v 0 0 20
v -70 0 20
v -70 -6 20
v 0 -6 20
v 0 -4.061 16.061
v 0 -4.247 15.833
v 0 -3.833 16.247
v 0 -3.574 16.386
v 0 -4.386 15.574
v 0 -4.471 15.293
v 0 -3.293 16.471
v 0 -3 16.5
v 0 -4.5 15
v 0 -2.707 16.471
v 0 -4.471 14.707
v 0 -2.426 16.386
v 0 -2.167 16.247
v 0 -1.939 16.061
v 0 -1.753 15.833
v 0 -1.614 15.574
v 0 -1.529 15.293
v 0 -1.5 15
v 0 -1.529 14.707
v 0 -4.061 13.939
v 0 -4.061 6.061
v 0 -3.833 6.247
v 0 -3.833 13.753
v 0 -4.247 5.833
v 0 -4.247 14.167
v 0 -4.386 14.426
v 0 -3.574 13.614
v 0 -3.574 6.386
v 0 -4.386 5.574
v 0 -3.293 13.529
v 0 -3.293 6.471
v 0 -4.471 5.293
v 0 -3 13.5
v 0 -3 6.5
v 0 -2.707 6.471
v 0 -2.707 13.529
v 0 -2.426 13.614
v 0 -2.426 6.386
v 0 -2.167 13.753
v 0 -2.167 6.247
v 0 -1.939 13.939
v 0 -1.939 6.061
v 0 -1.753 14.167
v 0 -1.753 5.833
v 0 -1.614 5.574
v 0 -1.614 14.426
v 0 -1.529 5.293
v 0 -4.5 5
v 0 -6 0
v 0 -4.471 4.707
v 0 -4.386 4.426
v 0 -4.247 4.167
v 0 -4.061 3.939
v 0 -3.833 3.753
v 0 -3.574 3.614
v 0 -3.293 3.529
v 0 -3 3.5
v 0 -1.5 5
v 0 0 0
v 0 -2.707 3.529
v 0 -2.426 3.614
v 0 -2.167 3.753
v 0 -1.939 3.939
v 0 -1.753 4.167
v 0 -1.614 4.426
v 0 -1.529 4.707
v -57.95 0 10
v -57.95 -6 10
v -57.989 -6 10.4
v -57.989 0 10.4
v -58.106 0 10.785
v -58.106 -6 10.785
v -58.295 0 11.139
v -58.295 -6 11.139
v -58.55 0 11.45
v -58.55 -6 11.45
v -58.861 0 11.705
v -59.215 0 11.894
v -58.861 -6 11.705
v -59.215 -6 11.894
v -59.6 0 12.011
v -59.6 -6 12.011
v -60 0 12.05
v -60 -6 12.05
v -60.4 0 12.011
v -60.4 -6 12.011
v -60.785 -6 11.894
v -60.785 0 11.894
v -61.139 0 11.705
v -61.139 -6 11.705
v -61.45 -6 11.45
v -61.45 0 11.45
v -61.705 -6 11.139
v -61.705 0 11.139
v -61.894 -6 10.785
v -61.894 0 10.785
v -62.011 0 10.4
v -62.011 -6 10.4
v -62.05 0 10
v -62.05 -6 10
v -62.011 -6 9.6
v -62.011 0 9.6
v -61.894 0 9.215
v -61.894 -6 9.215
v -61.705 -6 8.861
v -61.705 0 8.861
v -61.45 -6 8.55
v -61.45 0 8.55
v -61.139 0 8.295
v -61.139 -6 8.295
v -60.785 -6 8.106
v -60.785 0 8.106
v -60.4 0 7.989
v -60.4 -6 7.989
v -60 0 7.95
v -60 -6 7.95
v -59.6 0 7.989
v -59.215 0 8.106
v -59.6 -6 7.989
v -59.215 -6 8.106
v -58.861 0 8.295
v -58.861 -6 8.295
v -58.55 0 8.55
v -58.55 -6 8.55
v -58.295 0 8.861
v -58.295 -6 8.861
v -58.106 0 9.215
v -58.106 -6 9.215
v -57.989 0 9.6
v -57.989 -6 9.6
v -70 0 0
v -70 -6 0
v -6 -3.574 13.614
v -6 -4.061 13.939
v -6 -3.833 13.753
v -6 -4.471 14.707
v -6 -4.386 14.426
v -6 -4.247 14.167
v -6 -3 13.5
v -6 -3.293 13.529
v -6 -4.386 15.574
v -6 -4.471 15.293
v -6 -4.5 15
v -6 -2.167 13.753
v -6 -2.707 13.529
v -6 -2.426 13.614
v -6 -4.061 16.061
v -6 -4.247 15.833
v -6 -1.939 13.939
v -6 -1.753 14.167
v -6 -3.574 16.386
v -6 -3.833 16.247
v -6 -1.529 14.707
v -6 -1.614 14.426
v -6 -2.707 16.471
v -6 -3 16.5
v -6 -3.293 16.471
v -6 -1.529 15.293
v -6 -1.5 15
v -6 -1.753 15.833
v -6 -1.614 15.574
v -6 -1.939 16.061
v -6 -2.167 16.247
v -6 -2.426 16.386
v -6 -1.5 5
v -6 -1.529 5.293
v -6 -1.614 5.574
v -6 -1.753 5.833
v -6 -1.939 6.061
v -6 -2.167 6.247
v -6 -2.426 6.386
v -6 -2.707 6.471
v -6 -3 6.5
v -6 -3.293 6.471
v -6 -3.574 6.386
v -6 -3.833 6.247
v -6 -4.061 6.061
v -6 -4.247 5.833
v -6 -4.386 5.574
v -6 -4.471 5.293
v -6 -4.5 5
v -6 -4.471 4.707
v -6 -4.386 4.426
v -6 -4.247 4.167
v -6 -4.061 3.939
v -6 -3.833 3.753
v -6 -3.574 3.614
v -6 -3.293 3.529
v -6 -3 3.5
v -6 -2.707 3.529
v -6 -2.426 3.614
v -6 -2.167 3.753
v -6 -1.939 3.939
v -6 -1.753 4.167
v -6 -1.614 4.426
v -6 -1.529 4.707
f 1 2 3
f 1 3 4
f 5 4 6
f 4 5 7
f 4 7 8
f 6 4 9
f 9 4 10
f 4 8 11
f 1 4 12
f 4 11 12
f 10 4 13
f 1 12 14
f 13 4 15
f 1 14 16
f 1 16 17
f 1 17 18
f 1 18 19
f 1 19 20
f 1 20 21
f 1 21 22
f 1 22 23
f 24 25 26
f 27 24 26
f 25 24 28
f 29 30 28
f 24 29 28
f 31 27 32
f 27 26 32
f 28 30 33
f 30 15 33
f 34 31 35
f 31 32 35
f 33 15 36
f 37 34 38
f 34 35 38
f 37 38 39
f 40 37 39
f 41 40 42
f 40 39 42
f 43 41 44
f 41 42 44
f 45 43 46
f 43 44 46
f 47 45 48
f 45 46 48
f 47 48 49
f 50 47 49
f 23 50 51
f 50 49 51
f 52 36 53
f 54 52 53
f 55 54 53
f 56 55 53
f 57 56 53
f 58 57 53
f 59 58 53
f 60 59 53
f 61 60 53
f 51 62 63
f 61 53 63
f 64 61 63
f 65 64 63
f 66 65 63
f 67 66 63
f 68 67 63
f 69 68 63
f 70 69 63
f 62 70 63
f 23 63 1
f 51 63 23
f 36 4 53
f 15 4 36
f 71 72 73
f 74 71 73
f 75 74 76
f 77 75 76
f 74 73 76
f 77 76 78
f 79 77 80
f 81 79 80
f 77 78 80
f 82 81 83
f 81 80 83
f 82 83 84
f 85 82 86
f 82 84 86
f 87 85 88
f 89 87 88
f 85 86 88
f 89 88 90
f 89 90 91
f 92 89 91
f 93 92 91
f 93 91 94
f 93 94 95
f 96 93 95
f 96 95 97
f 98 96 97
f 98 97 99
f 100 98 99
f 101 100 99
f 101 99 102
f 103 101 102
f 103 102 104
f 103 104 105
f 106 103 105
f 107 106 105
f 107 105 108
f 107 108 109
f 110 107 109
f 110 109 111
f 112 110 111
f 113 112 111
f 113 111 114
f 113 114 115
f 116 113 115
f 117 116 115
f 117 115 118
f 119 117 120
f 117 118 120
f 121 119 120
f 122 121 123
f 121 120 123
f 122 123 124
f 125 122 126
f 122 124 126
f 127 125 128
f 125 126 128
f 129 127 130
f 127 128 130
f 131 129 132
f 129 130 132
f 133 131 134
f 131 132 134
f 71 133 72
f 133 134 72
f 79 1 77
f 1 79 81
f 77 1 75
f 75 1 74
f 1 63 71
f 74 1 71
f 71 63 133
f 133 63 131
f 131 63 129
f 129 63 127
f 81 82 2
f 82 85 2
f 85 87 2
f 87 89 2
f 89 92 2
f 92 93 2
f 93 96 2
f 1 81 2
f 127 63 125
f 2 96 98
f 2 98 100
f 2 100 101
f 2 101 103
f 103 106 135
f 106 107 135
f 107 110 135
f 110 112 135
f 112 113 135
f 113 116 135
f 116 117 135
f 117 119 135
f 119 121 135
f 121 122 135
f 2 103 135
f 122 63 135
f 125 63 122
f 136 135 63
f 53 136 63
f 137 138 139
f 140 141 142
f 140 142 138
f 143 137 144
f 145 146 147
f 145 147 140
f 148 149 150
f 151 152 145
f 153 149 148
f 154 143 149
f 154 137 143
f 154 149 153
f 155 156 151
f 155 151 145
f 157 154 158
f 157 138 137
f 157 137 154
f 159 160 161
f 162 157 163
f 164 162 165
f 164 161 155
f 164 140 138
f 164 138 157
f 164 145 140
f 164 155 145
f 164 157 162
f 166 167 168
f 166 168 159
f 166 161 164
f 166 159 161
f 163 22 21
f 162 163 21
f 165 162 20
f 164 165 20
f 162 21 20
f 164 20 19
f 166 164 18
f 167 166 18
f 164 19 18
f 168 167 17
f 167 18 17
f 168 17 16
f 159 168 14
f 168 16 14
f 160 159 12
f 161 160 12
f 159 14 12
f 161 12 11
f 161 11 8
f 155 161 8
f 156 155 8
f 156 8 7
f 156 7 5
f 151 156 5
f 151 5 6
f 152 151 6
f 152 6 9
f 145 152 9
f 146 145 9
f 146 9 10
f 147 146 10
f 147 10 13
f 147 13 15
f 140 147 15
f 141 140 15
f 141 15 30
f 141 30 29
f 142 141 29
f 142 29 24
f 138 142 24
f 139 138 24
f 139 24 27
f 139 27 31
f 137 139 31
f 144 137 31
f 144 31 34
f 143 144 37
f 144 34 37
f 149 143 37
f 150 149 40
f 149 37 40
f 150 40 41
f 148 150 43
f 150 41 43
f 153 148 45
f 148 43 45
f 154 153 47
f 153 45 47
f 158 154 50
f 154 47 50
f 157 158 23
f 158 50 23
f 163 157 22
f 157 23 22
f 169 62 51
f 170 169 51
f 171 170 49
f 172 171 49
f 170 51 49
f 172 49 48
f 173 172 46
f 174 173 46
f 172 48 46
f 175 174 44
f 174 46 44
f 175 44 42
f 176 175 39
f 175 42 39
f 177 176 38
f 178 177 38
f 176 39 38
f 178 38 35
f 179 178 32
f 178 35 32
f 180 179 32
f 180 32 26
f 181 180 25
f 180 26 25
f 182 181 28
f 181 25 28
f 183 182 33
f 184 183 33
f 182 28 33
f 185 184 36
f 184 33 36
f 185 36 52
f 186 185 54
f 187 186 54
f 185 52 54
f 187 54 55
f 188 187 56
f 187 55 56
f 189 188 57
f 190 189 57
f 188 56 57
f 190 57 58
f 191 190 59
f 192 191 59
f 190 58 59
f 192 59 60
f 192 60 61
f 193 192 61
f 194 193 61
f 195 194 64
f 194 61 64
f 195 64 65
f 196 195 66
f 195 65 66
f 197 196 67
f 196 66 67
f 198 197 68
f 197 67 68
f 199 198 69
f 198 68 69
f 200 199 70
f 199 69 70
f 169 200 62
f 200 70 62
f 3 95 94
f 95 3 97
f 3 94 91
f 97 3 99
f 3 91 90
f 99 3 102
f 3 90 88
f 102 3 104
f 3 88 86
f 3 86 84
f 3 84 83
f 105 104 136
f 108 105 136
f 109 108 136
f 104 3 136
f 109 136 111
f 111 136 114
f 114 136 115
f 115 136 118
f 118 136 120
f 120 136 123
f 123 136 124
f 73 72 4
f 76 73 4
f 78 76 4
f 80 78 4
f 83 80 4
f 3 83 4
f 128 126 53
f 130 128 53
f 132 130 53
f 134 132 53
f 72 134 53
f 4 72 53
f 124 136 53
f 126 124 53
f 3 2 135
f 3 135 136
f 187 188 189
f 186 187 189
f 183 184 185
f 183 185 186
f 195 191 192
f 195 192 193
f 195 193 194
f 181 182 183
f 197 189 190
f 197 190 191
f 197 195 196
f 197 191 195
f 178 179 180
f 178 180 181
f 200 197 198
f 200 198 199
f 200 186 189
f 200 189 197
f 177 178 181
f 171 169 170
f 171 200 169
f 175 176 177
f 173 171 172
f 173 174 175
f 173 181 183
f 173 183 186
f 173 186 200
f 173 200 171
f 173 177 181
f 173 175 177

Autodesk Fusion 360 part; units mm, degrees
sketch "スケッチ1" plane through (0, 0, 0) normal (0, 0, 1) x (1, 0, 0)
  line L0 (0, 0) -> (-70, 0)
  line L1 (-70, 0) -> (-70, -6)
  line L2 (-70, -6) -> (0, -6)
  line L3 (0, -6) -> (0, 0)
extrude "押し出し1" add sketch "スケッチ1" along normal blind 20
sketch "スケッチ2" plane through (0, -6, 0) normal (0, -1, 0) x (1, 0, 0)
  line L0 (-70, 0) -> (0, 0)
  line L1 (0, 0) -> (0, 20)
  line L2 (0, 20) -> (-70, 20)
  line L3 (-70, 20) -> (-70, 0)
  circle A0 centre (-60, 10) radius 2.05
extrude "押し出し2" cut sketch "スケッチ2" against normal blind 6 contours A0
sketch "スケッチ3" plane through (0, 0, 0) normal (1, 0, 0) x (0, 1, 0)
  line L0 (-6, 0) -> (0, 0)
  line L1 (0, 0) -> (0, 20)
  line L2 (0, 20) -> (-6, 20)
  line L3 (-6, 20) -> (-6, 0)
  circle A0 centre (-3, 5) radius 1.5
  circle A1 centre (-3, 15) radius 1.5
extrude "押し出し3" cut sketch "スケッチ3" against normal blind 6 contours A0 | A1
